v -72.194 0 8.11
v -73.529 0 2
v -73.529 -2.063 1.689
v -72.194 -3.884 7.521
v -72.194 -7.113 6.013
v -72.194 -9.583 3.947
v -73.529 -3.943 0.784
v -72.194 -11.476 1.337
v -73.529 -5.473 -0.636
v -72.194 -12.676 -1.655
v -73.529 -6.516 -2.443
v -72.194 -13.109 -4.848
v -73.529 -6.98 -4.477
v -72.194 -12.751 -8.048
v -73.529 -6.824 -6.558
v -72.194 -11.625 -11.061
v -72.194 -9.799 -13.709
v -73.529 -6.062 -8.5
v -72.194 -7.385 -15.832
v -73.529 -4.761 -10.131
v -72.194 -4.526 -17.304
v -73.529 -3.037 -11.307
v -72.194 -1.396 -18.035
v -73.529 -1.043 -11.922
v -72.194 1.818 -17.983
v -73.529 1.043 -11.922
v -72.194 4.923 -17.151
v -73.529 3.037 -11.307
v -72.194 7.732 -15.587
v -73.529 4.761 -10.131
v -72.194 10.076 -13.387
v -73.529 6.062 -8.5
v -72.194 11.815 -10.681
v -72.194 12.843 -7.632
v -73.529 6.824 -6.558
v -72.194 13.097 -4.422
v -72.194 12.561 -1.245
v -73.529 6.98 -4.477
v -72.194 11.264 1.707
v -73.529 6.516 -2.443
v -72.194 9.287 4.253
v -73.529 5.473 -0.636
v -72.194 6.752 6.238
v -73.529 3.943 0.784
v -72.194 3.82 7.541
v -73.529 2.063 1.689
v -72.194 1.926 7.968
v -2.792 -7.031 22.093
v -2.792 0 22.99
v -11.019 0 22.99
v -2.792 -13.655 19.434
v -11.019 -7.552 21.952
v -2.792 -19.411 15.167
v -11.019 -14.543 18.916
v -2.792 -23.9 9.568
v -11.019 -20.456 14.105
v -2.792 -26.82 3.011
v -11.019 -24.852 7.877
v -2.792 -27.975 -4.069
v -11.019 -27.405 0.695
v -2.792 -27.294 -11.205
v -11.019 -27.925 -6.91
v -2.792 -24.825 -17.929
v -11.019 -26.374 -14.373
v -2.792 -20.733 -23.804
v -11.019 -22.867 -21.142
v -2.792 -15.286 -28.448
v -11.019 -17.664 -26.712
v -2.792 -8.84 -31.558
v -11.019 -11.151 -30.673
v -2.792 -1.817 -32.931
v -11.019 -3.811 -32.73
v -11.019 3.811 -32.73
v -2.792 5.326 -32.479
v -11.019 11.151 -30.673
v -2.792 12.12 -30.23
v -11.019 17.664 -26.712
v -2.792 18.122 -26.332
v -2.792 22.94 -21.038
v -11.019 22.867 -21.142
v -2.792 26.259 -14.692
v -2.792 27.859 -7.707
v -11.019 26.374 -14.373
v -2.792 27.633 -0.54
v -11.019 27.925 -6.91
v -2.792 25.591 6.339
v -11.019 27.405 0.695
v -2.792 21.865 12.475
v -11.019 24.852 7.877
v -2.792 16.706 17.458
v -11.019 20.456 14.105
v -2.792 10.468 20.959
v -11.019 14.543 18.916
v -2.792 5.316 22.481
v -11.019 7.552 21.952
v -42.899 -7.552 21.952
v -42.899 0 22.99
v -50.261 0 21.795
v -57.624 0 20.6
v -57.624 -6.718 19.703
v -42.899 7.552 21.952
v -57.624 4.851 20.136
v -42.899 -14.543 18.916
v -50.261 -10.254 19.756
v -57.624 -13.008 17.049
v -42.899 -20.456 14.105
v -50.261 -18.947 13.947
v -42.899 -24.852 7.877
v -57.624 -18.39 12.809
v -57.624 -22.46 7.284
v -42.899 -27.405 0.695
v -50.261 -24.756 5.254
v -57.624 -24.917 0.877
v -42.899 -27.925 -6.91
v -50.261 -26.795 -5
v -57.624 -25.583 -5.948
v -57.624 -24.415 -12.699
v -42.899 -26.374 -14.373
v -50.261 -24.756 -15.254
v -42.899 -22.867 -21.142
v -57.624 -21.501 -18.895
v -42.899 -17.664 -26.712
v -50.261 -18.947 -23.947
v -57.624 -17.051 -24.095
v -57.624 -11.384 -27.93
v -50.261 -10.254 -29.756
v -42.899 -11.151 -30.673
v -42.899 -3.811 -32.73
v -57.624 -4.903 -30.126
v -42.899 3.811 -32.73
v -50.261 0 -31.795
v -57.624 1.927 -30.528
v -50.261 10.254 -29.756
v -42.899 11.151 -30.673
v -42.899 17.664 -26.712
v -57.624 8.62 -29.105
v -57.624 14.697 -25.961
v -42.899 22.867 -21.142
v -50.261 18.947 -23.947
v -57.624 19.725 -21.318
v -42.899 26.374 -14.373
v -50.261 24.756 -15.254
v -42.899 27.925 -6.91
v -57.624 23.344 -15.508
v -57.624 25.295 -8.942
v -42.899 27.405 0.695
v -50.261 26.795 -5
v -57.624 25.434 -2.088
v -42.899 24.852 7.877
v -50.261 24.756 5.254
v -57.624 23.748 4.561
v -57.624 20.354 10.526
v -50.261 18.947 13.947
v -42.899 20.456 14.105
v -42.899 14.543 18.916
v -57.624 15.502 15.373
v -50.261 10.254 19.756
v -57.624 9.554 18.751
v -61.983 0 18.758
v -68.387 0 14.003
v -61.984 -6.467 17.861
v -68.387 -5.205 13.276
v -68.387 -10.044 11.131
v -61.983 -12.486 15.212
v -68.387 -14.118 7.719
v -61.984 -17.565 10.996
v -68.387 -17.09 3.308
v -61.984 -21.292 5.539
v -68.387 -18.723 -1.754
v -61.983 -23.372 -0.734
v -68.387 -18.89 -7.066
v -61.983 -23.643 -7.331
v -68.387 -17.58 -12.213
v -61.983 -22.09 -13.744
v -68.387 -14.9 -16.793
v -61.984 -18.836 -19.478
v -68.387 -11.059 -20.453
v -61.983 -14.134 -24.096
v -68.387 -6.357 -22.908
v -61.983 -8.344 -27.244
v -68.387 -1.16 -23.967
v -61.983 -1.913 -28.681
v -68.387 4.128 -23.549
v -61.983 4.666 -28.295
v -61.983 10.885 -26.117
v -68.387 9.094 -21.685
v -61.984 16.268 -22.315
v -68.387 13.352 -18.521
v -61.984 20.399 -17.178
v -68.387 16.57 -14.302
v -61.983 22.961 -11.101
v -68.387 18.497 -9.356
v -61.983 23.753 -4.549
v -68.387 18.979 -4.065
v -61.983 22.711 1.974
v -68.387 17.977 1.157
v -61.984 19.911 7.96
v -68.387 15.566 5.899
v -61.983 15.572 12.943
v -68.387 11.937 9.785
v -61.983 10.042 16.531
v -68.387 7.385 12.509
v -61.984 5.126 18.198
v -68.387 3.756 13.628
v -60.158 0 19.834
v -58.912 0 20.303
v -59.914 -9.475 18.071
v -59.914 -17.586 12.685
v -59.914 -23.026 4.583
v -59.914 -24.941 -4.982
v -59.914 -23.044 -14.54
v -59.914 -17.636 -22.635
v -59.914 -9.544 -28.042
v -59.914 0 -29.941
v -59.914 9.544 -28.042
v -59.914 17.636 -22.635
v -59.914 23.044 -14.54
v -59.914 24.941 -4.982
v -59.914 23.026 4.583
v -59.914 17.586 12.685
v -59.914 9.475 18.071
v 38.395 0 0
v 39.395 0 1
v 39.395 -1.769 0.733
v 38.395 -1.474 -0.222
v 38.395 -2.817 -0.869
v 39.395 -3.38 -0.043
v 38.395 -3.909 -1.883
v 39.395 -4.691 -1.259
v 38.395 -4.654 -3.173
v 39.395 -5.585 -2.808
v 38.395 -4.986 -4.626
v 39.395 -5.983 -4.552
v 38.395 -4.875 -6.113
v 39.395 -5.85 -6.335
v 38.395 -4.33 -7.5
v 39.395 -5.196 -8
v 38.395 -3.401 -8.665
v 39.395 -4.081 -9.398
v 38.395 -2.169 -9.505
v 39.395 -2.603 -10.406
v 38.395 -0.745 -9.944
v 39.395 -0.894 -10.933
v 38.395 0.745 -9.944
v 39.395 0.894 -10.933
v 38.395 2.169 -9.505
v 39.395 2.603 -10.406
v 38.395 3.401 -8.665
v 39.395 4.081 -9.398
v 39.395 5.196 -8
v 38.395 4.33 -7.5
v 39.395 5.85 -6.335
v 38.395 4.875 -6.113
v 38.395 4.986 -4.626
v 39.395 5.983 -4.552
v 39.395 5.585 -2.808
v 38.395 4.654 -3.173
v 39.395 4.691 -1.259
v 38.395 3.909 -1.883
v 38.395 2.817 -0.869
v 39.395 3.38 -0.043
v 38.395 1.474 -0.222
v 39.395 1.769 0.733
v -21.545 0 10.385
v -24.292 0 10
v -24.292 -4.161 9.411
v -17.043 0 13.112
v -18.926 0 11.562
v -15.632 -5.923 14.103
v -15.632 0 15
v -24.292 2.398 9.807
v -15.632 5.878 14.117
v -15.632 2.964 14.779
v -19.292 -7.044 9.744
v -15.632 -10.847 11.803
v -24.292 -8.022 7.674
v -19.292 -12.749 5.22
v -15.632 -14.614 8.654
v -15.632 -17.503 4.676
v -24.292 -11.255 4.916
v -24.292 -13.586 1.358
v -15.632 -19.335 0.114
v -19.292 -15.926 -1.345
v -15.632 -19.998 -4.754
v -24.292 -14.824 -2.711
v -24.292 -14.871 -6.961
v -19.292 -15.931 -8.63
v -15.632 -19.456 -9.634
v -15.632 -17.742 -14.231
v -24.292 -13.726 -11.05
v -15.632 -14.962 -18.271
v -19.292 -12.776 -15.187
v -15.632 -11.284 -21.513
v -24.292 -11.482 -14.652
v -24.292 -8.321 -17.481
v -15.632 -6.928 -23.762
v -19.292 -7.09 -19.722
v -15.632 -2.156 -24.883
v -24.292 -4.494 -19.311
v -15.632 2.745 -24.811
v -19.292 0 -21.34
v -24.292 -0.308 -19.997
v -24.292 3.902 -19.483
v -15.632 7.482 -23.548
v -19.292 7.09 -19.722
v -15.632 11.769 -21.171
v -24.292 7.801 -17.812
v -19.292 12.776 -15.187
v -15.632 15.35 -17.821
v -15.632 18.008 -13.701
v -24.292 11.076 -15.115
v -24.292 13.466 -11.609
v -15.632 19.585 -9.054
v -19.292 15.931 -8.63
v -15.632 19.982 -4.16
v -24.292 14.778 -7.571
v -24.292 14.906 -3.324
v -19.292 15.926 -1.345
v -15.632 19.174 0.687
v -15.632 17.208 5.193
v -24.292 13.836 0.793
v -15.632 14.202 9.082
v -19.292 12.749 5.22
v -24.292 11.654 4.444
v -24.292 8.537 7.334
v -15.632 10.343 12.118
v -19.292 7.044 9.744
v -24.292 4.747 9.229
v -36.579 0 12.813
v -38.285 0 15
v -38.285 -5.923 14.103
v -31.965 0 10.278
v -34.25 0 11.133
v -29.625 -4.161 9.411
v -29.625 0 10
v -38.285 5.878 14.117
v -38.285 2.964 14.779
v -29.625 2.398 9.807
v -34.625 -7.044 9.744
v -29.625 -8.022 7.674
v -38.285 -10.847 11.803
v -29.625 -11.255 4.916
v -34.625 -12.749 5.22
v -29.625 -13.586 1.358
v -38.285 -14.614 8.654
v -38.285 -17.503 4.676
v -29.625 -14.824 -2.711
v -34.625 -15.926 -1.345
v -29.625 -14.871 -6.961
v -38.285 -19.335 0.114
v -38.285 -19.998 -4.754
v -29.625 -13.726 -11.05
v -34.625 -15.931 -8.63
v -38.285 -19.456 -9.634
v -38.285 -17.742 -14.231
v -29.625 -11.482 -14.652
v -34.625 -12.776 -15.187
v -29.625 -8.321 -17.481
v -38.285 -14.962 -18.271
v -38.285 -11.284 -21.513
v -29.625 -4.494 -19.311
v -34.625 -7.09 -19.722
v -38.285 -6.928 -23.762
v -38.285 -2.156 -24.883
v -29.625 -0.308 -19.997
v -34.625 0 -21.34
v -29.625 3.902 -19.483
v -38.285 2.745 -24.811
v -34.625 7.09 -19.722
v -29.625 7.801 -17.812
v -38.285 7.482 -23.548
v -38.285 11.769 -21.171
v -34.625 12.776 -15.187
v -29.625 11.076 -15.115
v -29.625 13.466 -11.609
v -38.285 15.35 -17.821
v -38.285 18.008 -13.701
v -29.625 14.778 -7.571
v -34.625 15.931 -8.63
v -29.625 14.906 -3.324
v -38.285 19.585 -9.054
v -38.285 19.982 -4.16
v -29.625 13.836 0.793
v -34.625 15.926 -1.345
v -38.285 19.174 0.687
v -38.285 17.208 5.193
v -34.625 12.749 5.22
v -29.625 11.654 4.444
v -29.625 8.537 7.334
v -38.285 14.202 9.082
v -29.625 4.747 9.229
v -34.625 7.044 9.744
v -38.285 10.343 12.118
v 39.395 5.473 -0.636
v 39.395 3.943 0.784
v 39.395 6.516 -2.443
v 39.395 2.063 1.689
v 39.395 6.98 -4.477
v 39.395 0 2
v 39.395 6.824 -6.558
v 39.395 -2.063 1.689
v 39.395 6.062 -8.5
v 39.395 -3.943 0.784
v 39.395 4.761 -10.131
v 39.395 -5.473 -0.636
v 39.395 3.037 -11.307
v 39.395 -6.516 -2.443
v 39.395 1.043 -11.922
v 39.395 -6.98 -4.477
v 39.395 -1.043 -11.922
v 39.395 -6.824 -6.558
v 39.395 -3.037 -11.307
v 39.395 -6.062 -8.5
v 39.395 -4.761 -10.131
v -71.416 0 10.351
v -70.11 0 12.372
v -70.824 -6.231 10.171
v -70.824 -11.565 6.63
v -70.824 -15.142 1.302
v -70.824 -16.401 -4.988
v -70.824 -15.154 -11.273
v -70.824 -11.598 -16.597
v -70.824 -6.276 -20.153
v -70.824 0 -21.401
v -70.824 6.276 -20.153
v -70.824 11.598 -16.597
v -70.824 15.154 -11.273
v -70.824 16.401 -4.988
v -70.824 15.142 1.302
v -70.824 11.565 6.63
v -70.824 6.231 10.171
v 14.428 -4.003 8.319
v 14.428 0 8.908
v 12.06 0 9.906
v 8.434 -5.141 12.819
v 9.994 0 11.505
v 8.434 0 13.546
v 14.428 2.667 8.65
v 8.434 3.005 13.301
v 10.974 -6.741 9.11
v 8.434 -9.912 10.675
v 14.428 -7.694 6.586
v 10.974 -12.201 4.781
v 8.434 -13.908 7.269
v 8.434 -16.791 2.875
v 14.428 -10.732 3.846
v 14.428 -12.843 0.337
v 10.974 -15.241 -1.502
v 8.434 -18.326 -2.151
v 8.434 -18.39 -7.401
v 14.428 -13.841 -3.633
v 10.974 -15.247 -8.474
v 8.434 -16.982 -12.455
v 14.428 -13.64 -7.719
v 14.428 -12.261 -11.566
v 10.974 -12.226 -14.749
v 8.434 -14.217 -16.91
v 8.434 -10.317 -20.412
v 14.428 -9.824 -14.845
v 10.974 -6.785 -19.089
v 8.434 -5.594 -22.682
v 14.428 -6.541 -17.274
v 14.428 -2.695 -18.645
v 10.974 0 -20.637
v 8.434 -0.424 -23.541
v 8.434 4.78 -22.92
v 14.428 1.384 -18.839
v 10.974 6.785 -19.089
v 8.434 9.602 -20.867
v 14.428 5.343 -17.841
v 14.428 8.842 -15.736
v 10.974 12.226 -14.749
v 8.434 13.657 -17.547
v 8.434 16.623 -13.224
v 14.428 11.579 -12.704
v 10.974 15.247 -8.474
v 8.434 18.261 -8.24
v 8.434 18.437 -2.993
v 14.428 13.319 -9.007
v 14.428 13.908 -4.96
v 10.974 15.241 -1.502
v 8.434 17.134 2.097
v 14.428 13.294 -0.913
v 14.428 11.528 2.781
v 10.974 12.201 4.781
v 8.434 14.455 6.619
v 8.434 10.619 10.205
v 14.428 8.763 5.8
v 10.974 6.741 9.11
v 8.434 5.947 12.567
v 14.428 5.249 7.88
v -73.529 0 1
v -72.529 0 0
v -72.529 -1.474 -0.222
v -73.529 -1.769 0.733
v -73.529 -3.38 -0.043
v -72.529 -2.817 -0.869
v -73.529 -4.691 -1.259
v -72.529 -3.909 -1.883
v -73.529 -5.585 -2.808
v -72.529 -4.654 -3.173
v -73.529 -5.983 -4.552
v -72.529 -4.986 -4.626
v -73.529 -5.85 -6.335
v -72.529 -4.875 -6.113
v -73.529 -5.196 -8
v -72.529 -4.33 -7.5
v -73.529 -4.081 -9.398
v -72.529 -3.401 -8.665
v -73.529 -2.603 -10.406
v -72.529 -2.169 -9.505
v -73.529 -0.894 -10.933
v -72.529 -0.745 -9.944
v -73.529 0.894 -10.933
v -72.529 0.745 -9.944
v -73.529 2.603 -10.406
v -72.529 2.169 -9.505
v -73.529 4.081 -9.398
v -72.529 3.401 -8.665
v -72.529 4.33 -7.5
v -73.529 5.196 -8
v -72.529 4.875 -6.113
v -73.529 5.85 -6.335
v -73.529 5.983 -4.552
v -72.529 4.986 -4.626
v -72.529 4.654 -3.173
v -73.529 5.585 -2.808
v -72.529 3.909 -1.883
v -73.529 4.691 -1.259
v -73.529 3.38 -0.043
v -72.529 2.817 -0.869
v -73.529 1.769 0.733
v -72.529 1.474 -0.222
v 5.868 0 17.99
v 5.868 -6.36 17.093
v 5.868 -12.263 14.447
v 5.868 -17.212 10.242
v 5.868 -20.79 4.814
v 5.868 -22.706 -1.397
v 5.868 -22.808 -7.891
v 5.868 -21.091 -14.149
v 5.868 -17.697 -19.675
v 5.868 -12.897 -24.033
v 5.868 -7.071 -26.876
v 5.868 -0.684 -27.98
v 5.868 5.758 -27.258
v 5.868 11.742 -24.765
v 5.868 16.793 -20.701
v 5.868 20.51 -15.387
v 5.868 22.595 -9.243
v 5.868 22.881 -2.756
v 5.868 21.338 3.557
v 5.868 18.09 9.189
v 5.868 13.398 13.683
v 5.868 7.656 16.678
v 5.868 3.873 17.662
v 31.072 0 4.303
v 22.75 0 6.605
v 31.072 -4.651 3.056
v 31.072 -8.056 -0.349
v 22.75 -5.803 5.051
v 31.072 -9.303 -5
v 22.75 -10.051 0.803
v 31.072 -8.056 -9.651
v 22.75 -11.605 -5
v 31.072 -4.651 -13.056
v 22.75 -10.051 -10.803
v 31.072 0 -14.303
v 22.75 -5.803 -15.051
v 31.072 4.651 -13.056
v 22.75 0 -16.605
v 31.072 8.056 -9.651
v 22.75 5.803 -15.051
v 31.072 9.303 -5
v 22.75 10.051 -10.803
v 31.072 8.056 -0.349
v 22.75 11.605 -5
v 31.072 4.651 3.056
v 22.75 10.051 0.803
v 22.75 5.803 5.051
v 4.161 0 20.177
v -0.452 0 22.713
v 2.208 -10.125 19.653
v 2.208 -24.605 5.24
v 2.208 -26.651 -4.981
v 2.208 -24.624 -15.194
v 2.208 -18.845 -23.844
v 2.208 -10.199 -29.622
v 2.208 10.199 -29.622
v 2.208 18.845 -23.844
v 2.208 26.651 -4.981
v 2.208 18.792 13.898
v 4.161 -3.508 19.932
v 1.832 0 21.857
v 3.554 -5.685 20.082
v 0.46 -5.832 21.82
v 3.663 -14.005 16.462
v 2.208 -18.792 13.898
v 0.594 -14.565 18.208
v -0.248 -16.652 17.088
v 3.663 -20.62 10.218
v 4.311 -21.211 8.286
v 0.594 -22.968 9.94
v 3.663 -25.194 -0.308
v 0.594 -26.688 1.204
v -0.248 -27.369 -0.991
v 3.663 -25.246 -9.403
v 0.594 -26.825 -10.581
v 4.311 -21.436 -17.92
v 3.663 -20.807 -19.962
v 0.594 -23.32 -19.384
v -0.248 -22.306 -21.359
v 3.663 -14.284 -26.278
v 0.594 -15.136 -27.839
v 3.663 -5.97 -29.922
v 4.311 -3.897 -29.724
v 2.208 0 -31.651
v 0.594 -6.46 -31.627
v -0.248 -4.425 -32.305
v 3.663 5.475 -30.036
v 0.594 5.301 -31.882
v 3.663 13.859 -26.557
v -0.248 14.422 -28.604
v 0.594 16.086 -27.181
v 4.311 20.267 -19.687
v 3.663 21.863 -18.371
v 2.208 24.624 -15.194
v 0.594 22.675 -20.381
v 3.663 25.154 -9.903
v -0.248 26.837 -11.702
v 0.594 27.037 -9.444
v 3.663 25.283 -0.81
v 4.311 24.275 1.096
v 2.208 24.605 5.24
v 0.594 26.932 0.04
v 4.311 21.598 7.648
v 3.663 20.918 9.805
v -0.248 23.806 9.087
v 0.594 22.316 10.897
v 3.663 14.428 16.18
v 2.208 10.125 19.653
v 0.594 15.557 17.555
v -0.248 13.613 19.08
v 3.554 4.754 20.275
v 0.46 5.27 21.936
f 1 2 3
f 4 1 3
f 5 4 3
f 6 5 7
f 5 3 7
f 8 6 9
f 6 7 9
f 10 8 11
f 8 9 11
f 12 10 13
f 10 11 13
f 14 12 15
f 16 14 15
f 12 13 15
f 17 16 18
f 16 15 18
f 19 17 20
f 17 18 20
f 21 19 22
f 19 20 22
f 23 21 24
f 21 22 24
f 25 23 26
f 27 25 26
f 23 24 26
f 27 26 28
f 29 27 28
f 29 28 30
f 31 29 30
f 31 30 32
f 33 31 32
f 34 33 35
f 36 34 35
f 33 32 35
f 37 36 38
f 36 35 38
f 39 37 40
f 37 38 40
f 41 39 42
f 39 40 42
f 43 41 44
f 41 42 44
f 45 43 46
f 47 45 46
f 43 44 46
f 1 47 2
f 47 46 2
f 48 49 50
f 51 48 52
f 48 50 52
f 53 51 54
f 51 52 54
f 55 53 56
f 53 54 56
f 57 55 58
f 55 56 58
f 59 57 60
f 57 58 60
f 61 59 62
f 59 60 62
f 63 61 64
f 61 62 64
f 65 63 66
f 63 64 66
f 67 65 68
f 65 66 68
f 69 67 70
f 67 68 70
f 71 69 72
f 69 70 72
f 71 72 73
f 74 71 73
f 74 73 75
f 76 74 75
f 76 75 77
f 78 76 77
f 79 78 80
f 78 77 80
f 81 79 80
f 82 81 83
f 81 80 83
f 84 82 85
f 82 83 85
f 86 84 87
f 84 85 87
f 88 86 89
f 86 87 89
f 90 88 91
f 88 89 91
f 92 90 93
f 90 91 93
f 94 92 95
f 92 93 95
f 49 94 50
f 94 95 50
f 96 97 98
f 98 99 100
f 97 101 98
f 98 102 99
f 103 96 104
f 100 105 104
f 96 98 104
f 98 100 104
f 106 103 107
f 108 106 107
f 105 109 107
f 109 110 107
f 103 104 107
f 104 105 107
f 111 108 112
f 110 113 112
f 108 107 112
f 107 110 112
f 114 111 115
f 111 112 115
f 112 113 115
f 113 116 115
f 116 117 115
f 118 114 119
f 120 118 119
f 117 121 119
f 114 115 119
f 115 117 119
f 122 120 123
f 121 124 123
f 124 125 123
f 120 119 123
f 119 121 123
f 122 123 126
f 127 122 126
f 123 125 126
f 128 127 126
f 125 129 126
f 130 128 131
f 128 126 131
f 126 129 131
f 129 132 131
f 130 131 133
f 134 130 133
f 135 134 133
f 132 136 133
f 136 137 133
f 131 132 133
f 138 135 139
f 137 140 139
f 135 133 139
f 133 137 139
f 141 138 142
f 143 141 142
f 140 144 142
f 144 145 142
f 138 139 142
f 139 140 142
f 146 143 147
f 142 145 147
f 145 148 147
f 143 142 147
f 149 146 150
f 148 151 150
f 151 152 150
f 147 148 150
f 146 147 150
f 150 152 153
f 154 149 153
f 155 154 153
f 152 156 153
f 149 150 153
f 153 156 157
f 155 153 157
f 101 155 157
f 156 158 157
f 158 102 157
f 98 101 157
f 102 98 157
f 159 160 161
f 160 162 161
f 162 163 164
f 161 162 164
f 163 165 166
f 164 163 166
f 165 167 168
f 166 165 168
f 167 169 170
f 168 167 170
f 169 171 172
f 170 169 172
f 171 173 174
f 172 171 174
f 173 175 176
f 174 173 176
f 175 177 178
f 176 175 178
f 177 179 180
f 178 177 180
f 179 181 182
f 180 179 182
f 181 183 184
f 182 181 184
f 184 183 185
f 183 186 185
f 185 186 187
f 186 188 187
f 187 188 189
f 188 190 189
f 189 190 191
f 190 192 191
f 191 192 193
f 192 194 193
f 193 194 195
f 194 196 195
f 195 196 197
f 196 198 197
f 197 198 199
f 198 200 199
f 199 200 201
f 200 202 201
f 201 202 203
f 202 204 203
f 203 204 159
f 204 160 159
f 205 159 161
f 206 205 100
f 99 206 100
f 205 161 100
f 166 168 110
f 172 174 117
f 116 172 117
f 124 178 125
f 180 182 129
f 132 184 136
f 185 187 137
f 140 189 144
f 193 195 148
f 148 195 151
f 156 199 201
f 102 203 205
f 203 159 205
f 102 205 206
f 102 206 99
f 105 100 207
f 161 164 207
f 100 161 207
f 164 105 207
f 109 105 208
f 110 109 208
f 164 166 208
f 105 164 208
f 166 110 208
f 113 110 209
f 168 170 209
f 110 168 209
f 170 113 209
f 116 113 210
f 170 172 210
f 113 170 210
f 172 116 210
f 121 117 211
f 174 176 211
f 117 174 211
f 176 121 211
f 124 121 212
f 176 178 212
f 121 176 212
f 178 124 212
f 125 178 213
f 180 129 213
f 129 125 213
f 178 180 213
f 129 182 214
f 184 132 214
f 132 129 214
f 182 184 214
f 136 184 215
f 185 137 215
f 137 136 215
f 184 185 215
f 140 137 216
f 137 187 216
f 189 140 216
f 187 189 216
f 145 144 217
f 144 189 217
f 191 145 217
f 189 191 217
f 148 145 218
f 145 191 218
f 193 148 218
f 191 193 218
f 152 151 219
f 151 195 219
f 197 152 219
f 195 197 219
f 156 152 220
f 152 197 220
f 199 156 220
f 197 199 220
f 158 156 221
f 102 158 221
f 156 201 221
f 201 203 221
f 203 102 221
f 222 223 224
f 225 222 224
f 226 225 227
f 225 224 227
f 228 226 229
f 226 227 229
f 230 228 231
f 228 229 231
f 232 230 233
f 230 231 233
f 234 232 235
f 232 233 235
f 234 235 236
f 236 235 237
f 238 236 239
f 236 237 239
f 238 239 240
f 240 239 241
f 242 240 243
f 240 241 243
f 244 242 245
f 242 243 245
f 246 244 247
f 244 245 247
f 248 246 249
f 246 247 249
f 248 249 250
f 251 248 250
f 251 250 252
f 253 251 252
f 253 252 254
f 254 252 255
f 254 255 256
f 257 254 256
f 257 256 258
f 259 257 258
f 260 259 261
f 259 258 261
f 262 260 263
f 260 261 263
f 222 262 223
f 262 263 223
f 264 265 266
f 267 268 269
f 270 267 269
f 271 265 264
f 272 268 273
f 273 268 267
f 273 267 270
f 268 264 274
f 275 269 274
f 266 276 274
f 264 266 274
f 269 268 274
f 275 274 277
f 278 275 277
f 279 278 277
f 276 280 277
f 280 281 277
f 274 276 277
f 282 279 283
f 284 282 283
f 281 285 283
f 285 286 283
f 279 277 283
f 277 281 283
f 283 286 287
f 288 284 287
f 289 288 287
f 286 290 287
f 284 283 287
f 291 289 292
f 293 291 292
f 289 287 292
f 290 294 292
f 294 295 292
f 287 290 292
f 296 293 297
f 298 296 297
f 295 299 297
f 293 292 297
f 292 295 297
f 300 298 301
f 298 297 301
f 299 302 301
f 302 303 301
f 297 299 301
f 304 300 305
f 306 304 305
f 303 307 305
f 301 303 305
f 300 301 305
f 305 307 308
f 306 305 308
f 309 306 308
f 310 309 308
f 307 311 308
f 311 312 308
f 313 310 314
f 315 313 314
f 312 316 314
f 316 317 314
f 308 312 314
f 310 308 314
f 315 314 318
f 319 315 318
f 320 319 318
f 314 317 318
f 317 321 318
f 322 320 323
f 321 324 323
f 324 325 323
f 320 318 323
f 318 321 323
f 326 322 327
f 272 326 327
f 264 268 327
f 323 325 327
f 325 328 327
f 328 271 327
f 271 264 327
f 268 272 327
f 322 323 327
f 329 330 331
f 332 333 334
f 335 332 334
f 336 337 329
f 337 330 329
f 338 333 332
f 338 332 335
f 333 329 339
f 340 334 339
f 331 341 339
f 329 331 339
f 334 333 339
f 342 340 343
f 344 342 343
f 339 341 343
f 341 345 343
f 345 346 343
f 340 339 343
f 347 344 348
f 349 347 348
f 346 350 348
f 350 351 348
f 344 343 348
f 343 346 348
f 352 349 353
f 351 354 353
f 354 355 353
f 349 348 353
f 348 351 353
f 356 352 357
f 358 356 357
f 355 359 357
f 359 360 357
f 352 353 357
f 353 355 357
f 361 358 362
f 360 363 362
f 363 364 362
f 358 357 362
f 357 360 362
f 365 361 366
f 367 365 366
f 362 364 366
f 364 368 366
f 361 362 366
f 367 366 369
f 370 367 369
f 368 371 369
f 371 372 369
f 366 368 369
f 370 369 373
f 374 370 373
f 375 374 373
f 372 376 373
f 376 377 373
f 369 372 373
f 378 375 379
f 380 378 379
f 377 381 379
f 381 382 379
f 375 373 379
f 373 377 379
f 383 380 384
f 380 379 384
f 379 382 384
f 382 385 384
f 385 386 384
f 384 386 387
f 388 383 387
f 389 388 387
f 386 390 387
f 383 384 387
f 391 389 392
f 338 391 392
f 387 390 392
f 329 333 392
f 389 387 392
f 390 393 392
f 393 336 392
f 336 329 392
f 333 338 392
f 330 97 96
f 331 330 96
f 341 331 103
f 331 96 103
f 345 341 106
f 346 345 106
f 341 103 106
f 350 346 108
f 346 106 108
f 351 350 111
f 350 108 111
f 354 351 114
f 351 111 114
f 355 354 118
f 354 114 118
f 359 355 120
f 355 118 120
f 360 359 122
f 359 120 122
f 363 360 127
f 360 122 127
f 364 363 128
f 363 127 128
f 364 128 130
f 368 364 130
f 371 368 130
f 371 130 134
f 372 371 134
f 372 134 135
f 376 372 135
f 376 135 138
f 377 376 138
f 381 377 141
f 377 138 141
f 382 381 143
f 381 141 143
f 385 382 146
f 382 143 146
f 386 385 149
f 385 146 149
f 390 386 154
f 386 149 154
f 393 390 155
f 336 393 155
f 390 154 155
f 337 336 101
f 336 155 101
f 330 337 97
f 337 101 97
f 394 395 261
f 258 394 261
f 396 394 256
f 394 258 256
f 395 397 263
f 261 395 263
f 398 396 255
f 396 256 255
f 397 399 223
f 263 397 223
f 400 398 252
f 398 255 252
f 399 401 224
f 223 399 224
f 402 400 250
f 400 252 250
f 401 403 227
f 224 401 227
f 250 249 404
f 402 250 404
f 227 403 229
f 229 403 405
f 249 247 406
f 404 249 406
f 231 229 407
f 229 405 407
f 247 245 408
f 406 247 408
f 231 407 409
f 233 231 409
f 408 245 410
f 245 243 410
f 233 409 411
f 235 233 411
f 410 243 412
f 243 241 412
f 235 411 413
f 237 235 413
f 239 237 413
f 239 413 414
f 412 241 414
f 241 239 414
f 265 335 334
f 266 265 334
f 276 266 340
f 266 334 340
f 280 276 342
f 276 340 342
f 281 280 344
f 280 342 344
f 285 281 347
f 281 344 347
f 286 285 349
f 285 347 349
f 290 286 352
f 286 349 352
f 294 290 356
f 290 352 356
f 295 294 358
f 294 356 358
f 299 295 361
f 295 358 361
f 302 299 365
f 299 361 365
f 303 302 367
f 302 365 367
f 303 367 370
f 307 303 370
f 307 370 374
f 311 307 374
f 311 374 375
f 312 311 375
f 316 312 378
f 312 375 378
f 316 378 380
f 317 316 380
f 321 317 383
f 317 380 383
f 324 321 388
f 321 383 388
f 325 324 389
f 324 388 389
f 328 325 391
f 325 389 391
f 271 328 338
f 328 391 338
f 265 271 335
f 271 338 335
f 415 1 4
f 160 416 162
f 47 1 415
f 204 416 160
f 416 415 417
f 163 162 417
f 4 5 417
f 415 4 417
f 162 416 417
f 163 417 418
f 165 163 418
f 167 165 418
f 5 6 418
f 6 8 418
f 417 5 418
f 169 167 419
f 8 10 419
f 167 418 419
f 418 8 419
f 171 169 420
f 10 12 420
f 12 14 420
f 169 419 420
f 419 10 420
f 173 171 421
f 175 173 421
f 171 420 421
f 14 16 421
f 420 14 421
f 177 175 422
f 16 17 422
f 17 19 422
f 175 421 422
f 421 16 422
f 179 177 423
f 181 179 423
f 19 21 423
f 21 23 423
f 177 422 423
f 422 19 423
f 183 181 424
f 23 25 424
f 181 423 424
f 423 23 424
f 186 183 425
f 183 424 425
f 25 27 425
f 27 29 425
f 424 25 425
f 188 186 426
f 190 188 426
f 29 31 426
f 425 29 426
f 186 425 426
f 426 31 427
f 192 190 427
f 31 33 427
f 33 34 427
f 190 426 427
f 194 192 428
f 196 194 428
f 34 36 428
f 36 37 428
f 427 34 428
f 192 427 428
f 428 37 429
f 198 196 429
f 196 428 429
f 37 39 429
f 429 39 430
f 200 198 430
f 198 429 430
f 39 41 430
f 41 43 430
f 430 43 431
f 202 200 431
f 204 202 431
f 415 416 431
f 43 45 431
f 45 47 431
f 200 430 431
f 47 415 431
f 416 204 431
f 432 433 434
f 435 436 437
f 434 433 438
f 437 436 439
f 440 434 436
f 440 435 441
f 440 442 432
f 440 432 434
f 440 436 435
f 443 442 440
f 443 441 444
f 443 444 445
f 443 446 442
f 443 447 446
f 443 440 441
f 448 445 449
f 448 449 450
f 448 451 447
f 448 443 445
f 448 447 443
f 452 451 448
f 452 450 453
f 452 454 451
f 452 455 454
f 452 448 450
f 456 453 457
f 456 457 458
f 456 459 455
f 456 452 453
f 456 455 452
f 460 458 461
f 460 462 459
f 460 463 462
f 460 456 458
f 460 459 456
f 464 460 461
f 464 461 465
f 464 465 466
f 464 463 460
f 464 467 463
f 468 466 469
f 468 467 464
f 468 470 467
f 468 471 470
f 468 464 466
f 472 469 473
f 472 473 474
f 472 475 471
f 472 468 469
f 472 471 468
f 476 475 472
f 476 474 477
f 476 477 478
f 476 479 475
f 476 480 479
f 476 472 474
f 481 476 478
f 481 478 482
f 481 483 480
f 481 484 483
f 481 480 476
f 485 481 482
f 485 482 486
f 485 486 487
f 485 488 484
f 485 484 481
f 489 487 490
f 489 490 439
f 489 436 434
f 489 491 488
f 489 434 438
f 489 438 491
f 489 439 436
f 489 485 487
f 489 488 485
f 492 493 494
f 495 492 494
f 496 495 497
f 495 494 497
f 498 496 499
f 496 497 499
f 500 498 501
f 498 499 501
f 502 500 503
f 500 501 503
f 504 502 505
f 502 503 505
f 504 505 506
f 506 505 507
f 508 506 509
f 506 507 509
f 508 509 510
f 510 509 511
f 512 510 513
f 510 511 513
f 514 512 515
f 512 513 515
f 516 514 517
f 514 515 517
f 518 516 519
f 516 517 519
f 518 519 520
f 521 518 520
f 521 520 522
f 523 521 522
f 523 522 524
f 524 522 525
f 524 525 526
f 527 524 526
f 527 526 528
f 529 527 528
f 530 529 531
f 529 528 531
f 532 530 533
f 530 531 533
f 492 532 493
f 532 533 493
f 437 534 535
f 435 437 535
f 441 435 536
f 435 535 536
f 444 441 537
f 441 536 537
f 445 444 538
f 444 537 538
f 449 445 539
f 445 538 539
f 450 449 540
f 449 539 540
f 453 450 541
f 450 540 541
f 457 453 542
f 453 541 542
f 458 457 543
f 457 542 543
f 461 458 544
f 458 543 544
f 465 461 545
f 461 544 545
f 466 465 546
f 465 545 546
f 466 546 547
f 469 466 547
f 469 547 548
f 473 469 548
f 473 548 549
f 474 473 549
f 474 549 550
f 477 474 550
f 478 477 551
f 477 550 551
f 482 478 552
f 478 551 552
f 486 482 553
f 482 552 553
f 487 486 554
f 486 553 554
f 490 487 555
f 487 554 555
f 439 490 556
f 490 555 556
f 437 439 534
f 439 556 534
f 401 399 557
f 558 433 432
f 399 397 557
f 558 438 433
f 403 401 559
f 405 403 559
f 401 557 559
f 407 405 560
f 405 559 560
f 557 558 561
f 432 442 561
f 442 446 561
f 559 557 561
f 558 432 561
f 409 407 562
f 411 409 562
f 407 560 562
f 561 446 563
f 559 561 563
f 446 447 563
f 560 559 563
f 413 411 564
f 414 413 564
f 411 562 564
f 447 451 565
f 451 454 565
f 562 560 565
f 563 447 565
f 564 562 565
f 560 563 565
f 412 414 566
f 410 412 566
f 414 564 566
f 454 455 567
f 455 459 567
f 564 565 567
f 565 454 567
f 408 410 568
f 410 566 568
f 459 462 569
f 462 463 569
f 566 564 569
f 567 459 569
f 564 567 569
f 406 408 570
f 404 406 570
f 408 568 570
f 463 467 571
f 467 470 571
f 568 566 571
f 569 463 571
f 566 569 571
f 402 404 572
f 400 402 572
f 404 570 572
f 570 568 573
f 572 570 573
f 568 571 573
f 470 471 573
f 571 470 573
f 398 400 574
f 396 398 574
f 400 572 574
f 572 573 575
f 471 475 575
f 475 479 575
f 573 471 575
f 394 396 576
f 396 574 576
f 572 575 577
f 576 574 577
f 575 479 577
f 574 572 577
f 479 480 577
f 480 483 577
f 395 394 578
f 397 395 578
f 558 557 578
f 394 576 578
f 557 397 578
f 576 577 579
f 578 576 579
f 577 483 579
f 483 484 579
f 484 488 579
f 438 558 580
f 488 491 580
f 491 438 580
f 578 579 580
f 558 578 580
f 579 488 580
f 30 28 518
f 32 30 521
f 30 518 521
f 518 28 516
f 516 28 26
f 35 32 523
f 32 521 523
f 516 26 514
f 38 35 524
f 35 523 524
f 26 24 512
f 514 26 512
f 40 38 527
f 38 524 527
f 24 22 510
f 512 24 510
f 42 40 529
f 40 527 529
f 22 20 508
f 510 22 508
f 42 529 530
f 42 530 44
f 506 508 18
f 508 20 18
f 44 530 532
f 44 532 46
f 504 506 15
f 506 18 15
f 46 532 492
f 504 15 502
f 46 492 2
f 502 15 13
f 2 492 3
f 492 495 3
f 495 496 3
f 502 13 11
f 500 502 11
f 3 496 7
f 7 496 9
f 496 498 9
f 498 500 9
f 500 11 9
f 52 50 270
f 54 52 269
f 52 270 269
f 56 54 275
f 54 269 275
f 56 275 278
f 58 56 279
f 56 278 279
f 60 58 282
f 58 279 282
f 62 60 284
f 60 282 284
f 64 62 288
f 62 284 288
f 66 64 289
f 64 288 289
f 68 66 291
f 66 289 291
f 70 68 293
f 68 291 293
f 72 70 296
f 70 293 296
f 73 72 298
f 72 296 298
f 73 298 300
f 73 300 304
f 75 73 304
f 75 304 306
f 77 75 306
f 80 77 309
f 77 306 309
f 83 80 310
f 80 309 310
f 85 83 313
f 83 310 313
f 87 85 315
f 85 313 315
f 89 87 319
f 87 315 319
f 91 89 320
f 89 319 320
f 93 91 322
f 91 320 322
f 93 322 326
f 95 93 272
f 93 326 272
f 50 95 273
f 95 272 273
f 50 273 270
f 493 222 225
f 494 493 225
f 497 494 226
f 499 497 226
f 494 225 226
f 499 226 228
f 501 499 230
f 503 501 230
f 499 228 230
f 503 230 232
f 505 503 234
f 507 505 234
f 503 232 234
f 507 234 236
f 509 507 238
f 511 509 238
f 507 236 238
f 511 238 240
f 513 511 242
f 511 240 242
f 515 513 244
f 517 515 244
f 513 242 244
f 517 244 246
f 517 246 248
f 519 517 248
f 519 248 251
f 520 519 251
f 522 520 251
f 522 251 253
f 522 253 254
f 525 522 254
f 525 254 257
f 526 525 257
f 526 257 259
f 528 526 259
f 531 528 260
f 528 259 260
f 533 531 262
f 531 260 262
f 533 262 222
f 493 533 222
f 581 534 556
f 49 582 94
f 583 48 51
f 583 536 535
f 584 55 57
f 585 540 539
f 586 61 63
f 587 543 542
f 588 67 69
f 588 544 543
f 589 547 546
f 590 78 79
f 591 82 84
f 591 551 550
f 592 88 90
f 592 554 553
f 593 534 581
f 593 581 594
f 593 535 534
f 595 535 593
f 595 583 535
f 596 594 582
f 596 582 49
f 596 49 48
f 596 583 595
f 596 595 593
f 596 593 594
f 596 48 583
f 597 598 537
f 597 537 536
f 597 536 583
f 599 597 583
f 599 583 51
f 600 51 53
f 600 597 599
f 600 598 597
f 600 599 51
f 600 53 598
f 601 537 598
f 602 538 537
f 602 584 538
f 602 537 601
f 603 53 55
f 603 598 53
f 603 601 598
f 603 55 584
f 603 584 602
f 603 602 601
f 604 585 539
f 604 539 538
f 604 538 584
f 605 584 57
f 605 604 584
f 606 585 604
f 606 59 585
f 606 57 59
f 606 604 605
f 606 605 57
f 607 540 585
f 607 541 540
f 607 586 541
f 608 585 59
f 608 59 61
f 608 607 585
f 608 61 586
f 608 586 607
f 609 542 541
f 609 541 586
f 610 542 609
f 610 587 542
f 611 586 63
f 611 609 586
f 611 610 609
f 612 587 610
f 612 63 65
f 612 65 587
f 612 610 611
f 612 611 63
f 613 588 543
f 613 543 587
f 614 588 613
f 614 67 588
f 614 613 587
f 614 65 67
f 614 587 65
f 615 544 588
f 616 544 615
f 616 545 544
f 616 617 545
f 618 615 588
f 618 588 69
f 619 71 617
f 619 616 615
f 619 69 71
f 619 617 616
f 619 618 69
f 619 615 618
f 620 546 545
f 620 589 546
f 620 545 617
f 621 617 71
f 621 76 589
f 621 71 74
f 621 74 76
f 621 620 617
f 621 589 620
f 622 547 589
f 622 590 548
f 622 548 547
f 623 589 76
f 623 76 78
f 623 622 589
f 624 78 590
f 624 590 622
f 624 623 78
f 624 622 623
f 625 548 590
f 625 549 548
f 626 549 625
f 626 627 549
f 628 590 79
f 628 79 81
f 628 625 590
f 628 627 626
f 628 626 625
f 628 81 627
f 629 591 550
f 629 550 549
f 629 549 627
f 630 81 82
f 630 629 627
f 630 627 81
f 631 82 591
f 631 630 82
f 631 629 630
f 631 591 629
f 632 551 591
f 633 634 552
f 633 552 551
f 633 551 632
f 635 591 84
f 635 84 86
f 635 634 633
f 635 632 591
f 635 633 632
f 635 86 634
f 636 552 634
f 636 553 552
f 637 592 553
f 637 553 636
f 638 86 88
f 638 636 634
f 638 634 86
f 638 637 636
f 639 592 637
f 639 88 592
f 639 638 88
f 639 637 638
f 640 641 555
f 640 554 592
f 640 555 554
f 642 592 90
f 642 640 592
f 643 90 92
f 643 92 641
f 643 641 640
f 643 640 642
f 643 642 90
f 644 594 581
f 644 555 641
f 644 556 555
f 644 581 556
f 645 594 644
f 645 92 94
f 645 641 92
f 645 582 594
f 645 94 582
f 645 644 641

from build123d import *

# Parameters (mm, degrees)
F2_SIZE2 = 10
F2_SIZE  = 7
F3_R     = 10
F4_SIZE  = 1


with BuildPart() as f1:
    # F0 (on Front) → F1 (revolve)
    with BuildSketch(Plane.XZ):
        Polygon((-69.8987477026, 18.6077695012), (-73.5294490392, 2), (-73.5294490392, 0), (39.3949043283, 0), (39.3949043283, 2), (10.4812397387, 10), (2.9812397387, 22.9903810568), (-11.0187602613, 22.9903810568), (-18.5187602613, 10), (-35.3987477026, 10), (-42.8987477026, 22.9903810568), align=None)
    revolve(axis=Axis((-13.5878343135, 0, -5), (1, 0, 0)))

    # F2
    f2_edges = [f1.edges().sort_by_distance(p)[0] for p in [
        (-69.898748, 0, -28.60777),
    ]]
    chamfer(f2_edges, length=F2_SIZE, length2=F2_SIZE2)

    # F3
    f3_edges = [f1.edges().sort_by_distance(p)[0] for p in [
        (-35.398748, 0, -20),
        (-18.51876, 0, -20),
        (10.48124, 0, -20),
        (-60.027938, 0, -30.209983),
        (2.98124, 0, -32.990381),
        (-71.393742, 0, -21.769272),
    ]]
    fillet(f3_edges, radius=F3_R)

    # F4
    f4_edges = [f1.edges().sort_by_distance(p)[0] for p in [
        (-73.529449, 0, -10),
        (39.394904, 0, -10),
    ]]
    chamfer(f4_edges, length=F4_SIZE)


solid = f1.part
